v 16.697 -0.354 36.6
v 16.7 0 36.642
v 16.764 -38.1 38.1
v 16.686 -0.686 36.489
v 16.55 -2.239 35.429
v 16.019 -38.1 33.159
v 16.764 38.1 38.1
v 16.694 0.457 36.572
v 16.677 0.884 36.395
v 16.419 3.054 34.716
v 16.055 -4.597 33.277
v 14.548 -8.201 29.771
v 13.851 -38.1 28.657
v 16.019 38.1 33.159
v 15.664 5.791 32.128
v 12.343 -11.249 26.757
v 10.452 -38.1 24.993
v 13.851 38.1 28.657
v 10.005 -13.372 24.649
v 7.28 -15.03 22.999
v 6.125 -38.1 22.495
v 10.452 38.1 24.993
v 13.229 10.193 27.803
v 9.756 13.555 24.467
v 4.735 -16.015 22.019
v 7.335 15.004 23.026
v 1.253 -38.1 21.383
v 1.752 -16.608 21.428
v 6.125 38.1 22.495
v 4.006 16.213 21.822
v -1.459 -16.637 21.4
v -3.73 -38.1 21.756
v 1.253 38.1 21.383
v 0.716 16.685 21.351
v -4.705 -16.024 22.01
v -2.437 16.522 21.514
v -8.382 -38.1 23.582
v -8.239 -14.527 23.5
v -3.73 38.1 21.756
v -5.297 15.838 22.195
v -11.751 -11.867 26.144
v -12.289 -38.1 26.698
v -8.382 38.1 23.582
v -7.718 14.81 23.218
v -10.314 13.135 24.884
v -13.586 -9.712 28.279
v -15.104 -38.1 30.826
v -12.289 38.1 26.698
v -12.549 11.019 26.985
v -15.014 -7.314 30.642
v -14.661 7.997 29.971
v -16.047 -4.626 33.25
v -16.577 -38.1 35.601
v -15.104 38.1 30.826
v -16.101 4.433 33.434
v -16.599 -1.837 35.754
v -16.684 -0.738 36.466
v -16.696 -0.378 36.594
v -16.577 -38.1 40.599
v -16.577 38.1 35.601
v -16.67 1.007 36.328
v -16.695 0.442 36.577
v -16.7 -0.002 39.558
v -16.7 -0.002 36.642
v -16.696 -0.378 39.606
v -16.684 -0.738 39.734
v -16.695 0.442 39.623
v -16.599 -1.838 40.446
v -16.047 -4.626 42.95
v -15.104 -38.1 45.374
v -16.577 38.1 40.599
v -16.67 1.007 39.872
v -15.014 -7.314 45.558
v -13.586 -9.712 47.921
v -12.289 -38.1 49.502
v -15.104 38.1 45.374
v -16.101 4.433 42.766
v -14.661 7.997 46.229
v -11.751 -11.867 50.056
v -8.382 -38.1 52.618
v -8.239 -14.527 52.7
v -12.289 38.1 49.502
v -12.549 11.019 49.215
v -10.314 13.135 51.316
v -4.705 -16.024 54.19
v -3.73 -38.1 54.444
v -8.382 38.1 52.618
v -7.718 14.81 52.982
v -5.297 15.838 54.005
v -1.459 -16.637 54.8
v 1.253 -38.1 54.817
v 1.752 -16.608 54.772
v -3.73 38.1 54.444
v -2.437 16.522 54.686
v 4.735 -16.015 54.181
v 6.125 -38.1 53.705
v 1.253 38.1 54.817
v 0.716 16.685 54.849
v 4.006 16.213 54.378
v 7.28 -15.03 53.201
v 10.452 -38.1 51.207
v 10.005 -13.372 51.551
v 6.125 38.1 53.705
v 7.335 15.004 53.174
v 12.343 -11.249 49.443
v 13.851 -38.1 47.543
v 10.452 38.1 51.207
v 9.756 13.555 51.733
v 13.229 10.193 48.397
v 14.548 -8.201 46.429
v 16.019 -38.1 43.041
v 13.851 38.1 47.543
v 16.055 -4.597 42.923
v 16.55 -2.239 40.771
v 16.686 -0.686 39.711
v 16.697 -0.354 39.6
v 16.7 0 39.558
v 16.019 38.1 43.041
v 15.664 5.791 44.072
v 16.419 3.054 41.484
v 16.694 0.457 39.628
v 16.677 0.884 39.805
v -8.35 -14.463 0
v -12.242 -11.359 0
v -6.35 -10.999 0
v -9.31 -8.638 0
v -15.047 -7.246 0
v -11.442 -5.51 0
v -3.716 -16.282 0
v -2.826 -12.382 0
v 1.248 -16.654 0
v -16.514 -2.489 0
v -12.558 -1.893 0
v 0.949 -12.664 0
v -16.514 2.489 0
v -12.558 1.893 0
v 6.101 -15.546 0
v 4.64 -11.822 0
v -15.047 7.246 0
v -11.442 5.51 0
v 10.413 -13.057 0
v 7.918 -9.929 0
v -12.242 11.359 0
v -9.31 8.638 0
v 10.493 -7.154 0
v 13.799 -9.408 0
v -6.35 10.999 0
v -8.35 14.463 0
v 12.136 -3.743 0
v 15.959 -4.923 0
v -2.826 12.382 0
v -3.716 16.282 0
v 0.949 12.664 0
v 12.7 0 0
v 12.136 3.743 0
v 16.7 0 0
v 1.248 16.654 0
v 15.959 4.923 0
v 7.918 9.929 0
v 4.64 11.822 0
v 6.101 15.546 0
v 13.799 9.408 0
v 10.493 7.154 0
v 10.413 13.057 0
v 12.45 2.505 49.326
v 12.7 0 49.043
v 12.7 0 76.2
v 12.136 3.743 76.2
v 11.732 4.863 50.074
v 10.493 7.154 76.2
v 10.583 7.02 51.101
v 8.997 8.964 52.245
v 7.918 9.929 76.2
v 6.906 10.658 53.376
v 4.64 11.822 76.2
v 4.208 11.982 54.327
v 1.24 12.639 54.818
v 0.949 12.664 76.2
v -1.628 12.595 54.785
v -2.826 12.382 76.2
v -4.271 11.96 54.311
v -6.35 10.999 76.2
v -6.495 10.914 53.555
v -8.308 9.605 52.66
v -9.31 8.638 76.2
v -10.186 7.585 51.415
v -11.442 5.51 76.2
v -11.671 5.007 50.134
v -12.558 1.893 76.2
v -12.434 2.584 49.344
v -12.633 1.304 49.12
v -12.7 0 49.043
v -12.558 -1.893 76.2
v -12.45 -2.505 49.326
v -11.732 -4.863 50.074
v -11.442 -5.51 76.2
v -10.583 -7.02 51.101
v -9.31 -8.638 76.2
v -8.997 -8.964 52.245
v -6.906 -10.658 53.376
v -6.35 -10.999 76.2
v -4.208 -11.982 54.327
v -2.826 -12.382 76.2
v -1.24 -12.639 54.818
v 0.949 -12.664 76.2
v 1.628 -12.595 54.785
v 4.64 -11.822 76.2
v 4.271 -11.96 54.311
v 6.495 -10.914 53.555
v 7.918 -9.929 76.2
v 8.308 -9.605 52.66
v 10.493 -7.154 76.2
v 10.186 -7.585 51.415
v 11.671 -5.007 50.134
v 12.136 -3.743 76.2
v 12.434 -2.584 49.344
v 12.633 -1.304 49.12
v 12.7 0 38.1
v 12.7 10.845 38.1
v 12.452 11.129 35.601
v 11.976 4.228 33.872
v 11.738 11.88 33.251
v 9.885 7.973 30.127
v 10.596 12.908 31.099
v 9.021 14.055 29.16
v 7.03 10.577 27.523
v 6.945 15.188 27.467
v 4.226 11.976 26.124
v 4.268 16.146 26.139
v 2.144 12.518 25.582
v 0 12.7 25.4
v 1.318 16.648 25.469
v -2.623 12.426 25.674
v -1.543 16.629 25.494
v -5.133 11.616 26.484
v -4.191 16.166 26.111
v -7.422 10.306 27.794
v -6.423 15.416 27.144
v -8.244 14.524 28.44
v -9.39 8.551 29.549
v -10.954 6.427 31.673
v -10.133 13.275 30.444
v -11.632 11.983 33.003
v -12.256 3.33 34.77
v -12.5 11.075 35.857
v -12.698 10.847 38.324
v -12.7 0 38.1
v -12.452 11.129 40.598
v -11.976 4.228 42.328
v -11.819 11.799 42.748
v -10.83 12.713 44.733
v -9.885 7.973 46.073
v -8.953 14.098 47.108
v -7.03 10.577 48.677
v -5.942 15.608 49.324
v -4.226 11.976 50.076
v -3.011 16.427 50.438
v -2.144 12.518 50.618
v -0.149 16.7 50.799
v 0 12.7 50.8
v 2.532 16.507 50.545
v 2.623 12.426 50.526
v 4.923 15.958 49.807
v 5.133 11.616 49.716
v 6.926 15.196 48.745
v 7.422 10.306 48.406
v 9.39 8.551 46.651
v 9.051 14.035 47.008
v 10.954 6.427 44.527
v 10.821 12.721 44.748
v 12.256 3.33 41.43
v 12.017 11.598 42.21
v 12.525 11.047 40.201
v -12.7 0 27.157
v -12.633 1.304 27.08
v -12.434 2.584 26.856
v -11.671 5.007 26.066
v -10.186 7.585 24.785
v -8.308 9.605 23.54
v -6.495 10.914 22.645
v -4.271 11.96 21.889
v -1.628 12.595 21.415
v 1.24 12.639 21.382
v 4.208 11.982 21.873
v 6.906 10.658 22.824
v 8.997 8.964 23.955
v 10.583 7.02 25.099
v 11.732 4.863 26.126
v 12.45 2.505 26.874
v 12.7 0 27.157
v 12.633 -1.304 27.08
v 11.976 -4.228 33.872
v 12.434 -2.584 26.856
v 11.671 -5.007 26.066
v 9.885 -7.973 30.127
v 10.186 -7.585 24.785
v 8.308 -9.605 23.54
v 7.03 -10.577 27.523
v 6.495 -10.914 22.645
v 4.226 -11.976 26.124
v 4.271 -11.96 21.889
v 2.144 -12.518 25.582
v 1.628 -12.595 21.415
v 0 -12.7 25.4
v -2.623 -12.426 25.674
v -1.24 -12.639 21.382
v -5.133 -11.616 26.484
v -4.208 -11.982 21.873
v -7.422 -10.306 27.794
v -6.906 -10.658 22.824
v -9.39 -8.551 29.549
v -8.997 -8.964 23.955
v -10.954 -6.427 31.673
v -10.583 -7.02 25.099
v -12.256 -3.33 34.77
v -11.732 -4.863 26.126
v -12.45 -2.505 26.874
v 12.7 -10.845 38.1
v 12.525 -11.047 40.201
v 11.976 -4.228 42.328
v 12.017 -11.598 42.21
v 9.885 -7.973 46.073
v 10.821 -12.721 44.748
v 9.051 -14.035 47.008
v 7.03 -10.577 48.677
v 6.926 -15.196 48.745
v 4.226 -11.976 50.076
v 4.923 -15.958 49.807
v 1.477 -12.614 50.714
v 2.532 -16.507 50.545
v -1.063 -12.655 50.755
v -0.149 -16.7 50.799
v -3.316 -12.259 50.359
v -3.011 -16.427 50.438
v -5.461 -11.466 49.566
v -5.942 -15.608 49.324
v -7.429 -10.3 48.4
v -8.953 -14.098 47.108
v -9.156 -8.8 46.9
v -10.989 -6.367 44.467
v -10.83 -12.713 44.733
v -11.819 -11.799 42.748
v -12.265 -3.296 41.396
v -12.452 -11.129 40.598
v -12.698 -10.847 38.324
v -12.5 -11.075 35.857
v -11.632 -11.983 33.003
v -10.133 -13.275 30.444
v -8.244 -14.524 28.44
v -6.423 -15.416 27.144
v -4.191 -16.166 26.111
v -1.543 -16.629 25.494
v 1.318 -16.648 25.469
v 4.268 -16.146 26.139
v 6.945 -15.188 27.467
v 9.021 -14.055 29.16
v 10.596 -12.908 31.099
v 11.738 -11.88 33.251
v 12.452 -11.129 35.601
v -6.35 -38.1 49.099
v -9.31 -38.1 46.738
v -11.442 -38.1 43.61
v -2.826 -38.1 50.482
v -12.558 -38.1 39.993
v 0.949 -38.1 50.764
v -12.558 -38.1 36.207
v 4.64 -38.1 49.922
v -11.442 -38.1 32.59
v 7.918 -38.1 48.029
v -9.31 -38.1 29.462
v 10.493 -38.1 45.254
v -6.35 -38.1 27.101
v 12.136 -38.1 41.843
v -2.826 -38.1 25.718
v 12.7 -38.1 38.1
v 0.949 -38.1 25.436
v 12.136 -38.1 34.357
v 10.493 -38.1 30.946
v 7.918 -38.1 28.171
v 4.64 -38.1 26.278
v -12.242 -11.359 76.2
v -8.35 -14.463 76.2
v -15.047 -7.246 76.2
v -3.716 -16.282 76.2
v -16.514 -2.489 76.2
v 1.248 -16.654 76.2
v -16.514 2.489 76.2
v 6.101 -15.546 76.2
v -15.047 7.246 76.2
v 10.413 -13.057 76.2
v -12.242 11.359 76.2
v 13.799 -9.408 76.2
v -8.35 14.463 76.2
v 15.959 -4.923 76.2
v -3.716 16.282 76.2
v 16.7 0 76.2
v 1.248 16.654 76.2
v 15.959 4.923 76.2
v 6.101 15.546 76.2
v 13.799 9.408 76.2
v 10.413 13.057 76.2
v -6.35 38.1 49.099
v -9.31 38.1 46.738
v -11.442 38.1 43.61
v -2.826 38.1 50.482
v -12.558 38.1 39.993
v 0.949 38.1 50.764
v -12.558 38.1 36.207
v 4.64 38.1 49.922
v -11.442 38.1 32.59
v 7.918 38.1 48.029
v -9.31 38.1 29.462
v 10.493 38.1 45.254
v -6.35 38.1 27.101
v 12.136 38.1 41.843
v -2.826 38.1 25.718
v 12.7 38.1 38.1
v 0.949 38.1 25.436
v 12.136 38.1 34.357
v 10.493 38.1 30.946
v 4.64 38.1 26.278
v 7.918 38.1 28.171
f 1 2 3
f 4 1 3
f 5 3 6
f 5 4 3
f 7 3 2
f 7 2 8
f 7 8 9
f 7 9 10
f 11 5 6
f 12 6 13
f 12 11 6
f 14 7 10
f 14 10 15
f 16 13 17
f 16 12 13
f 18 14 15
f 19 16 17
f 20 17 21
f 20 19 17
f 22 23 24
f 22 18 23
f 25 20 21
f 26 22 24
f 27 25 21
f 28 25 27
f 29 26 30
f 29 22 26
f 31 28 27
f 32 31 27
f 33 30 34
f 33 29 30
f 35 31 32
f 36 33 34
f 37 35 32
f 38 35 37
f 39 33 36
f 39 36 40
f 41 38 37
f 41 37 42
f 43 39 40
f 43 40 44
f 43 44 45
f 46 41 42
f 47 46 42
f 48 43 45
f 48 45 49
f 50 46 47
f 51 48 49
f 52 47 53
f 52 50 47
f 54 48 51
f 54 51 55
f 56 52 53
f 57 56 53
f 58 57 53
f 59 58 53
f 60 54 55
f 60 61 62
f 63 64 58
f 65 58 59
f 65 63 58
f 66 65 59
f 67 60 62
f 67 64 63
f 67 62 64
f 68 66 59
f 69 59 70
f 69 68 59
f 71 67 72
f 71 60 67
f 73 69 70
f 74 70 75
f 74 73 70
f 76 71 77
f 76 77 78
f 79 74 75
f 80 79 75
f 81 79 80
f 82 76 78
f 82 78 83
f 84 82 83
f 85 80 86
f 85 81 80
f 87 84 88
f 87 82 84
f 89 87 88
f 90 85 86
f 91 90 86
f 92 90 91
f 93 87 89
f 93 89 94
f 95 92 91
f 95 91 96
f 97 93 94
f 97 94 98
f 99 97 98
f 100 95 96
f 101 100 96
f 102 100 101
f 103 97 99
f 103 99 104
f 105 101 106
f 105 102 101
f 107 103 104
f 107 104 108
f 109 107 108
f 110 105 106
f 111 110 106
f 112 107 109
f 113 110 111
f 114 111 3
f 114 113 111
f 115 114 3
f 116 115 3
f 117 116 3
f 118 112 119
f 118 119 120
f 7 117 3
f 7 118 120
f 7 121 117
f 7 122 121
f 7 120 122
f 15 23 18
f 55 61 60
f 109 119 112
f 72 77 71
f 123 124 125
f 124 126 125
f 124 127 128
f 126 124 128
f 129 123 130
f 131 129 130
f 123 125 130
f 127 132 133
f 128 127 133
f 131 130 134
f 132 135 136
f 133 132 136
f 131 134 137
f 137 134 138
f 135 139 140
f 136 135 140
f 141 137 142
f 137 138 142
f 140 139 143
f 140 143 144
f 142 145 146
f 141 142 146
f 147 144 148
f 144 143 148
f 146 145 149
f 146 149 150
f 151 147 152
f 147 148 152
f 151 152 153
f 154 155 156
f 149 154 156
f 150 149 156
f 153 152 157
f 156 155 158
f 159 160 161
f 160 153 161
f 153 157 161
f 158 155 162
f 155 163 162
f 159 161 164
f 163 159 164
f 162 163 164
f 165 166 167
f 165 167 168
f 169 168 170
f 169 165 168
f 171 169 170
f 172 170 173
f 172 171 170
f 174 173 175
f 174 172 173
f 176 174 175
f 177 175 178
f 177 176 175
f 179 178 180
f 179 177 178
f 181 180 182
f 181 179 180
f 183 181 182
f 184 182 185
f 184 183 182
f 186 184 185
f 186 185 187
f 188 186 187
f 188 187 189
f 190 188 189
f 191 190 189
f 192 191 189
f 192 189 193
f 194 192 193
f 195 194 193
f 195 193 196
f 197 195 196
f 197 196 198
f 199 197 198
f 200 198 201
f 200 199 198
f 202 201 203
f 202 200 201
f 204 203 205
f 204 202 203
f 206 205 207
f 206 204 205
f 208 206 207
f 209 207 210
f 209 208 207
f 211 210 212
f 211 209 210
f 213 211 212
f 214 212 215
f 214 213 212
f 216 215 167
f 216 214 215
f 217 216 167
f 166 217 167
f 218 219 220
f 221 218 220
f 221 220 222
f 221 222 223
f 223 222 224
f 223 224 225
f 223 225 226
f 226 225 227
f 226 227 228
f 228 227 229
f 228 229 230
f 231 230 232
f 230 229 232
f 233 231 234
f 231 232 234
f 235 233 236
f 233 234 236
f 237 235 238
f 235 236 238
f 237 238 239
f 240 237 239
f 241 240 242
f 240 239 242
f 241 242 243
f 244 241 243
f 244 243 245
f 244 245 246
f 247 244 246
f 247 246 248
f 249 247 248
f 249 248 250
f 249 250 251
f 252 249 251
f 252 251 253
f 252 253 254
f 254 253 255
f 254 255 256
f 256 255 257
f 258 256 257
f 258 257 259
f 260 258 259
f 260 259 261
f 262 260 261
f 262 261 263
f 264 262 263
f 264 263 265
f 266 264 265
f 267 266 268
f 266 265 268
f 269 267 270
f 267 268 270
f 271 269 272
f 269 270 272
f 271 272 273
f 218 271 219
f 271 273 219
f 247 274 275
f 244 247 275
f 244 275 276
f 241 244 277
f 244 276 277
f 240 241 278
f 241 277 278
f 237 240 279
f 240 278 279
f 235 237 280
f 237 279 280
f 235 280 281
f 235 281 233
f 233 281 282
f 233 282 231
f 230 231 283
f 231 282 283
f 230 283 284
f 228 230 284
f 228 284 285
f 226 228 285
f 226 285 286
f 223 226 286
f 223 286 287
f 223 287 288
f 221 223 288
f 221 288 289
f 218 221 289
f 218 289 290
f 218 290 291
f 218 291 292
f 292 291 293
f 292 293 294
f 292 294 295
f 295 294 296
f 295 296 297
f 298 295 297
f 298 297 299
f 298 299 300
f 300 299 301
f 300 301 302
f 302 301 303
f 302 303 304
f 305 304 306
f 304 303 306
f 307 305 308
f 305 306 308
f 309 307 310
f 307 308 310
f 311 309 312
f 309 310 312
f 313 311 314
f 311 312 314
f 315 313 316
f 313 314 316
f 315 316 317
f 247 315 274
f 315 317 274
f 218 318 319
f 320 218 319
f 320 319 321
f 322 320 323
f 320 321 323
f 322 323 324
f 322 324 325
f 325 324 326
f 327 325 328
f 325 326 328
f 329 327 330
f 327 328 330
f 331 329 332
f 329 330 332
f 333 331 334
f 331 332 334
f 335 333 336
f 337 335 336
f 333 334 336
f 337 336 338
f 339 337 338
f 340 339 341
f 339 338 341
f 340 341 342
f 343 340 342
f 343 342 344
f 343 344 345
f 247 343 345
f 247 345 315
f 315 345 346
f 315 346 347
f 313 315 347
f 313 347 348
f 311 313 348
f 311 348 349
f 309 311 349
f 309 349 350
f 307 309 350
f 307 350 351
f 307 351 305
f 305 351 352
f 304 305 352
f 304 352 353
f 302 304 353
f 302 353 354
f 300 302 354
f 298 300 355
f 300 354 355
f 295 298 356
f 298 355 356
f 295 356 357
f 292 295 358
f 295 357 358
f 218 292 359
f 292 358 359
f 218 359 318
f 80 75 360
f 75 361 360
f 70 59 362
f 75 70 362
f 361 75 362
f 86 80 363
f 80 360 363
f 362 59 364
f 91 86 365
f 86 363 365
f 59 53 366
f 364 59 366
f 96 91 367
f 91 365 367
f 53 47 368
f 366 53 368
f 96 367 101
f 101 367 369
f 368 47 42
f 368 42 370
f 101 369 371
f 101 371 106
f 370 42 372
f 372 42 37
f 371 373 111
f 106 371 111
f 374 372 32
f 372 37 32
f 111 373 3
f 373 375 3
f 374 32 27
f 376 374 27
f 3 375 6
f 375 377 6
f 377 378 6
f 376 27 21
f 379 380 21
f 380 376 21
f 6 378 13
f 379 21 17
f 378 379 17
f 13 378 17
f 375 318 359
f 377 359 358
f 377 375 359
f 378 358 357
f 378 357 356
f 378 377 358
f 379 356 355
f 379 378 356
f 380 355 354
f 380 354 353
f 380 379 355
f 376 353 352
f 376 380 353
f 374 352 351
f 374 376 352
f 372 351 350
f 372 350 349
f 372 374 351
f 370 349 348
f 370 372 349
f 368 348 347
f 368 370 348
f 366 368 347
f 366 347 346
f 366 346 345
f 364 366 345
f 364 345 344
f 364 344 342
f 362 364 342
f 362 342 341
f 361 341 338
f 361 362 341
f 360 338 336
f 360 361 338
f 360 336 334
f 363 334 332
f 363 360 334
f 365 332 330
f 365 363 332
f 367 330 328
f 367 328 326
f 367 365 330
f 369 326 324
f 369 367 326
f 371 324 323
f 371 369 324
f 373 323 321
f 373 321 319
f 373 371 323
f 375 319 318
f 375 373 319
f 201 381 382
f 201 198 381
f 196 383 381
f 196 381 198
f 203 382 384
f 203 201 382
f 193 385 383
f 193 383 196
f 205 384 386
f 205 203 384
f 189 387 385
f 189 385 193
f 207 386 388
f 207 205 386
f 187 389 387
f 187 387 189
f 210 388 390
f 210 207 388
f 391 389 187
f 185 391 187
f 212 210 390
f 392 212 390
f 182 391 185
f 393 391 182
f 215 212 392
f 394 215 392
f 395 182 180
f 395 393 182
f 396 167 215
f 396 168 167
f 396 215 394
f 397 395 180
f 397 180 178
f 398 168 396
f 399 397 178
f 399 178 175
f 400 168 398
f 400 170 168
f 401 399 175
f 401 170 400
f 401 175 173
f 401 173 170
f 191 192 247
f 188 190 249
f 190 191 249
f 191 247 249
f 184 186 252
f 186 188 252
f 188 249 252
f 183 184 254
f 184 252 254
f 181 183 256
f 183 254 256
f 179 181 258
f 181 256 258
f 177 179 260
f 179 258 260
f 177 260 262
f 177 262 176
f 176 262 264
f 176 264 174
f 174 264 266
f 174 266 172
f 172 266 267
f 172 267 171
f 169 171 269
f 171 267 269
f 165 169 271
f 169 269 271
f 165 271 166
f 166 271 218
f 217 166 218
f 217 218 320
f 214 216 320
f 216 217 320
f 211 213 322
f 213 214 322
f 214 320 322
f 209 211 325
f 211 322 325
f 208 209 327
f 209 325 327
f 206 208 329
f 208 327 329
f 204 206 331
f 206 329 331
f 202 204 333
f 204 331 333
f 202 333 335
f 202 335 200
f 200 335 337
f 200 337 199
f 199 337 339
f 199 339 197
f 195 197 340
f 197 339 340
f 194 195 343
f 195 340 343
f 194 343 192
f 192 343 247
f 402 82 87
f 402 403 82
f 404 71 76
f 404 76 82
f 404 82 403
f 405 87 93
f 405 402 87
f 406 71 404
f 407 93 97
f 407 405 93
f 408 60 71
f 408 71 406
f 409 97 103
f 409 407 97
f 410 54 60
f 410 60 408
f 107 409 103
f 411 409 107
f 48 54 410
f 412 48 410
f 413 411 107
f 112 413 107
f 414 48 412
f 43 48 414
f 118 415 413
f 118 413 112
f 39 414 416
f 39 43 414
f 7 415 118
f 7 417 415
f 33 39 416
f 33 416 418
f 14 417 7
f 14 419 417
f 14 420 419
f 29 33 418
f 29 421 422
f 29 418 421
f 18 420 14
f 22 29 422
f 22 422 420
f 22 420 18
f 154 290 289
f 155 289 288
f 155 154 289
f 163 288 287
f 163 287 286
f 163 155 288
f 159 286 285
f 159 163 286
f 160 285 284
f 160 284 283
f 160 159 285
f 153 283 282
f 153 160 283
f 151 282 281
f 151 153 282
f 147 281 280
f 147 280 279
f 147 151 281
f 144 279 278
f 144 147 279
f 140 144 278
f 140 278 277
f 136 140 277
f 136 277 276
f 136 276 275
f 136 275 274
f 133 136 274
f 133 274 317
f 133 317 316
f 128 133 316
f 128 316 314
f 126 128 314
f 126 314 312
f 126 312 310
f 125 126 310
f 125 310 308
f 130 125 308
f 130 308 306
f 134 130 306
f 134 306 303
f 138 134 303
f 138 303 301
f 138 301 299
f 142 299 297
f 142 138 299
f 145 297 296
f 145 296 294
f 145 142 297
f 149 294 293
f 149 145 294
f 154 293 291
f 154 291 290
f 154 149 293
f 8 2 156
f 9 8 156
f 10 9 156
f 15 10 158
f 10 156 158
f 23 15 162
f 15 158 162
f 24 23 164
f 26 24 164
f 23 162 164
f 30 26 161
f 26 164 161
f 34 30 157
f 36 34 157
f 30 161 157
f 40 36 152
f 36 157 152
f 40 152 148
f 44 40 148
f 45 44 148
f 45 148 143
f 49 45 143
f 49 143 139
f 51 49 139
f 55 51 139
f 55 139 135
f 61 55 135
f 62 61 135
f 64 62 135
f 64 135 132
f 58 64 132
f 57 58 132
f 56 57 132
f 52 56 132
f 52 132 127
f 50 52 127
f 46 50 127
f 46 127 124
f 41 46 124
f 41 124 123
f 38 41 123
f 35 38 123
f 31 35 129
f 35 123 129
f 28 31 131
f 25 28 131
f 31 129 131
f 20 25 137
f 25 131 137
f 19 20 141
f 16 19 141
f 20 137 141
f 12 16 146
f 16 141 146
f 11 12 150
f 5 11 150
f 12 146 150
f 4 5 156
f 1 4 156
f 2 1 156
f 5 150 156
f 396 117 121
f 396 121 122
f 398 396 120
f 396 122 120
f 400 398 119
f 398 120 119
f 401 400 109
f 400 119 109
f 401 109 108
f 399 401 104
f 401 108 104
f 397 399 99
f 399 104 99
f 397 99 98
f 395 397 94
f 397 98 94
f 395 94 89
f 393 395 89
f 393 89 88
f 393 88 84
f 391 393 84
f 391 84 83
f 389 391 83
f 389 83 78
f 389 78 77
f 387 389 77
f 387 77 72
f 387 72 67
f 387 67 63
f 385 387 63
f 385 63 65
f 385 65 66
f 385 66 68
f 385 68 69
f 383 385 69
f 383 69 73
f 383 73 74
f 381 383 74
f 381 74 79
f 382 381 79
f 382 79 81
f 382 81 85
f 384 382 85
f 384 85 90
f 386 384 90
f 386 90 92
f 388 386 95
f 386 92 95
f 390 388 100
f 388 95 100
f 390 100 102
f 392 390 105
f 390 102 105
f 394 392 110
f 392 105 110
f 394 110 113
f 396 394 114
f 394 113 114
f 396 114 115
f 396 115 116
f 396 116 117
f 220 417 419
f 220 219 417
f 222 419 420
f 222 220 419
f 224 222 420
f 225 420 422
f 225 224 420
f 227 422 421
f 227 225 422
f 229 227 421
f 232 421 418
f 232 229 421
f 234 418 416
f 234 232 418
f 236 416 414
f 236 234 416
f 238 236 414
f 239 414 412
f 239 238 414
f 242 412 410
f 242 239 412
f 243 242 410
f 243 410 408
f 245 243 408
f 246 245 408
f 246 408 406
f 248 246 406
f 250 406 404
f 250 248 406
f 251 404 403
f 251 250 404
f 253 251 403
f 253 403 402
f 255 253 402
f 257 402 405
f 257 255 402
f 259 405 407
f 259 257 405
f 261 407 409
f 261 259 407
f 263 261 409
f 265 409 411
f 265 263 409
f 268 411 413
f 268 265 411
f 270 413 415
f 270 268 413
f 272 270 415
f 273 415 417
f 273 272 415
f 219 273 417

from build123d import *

# Parameters (mm, degrees)
SKETCH1_R               = 16.7005
SKETCH1_R_2             = 12.7
BOSS_EXTRUDE1_DEPTH     = 76.2
SKETCH2_R               = 16.764
SKETCH2_R_2             = 12.7
BOSS_EXTRUDE2_DEPTH     = 38.1
CUT_EXTRUDE3_REACH      = 78.2
SKETCH5_R               = 12.7
SKETCH6_R               = 12.7
CUT_EXTRUDE4_DEPTH      = 1.0000001
CUT_EXTRUDE4_DEPTH_BACK = 77.2000001
SKETCH7_R               = 12.7
CUT_EXTRUDE5_DEPTH      = 77.2000001


with BuildPart() as part:
    # Sketch1 → Boss-Extrude1 (new body)
    with BuildSketch(Plane.XY):
        Circle(SKETCH1_R)
        Circle(SKETCH1_R_2, mode=Mode.SUBTRACT)
    extrude(amount=BOSS_EXTRUDE1_DEPTH)

    # Sketch2 → Boss-Extrude2 (add, symmetric)
    with BuildSketch(Plane(origin=(0, 0, 0), x_dir=(1, 0, 0), z_dir=(0, 1, 0))):
        with Locations((0, -38.1)):
            Circle(SKETCH2_R)
        with Locations((0, -38.1)):
            Circle(SKETCH2_R_2, mode=Mode.SUBTRACT)
    extrude(amount=BOSS_EXTRUDE2_DEPTH, both=True)

    # Sketch5 → Cut-Extrude3 (cut, up to next)
    with BuildSketch(Plane(origin=(0, 38.1, 0), x_dir=(1, 0, 0), z_dir=(0, 1, 0)), mode=Mode.PRIVATE) as cut_extrude3_sk1:
        with Locations((0, -38.1)):
            Circle(SKETCH5_R)
    cut_extrude3_tool1 = extrude(cut_extrude3_sk1.sketch, amount=-CUT_EXTRUDE3_REACH, mode=Mode.PRIVATE) & part.part
    add(cut_extrude3_tool1.solids().sort_by_distance((0, 38.1, 38.1))[0], mode=Mode.SUBTRACT)

    # Sketch6 → Cut-Extrude4 (cut, two sides)
    with BuildSketch(Plane(origin=(0, 0, 0), x_dir=(-1, 0, 0), z_dir=(0, 0, -1))) as cut_extrude4_sk:
        Circle(SKETCH6_R)
    extrude(amount=CUT_EXTRUDE4_DEPTH, mode=Mode.SUBTRACT)
    extrude(cut_extrude4_sk.sketch, amount=-CUT_EXTRUDE4_DEPTH_BACK, mode=Mode.SUBTRACT)

    # Sketch7 → Cut-Extrude5 (cut, through all)
    with BuildSketch(Plane.XZ.offset(38.1)):
        with Locations((0, 38.1)):
            Circle(SKETCH7_R)
    extrude(amount=-CUT_EXTRUDE5_DEPTH, mode=Mode.SUBTRACT)


solid = part.part
